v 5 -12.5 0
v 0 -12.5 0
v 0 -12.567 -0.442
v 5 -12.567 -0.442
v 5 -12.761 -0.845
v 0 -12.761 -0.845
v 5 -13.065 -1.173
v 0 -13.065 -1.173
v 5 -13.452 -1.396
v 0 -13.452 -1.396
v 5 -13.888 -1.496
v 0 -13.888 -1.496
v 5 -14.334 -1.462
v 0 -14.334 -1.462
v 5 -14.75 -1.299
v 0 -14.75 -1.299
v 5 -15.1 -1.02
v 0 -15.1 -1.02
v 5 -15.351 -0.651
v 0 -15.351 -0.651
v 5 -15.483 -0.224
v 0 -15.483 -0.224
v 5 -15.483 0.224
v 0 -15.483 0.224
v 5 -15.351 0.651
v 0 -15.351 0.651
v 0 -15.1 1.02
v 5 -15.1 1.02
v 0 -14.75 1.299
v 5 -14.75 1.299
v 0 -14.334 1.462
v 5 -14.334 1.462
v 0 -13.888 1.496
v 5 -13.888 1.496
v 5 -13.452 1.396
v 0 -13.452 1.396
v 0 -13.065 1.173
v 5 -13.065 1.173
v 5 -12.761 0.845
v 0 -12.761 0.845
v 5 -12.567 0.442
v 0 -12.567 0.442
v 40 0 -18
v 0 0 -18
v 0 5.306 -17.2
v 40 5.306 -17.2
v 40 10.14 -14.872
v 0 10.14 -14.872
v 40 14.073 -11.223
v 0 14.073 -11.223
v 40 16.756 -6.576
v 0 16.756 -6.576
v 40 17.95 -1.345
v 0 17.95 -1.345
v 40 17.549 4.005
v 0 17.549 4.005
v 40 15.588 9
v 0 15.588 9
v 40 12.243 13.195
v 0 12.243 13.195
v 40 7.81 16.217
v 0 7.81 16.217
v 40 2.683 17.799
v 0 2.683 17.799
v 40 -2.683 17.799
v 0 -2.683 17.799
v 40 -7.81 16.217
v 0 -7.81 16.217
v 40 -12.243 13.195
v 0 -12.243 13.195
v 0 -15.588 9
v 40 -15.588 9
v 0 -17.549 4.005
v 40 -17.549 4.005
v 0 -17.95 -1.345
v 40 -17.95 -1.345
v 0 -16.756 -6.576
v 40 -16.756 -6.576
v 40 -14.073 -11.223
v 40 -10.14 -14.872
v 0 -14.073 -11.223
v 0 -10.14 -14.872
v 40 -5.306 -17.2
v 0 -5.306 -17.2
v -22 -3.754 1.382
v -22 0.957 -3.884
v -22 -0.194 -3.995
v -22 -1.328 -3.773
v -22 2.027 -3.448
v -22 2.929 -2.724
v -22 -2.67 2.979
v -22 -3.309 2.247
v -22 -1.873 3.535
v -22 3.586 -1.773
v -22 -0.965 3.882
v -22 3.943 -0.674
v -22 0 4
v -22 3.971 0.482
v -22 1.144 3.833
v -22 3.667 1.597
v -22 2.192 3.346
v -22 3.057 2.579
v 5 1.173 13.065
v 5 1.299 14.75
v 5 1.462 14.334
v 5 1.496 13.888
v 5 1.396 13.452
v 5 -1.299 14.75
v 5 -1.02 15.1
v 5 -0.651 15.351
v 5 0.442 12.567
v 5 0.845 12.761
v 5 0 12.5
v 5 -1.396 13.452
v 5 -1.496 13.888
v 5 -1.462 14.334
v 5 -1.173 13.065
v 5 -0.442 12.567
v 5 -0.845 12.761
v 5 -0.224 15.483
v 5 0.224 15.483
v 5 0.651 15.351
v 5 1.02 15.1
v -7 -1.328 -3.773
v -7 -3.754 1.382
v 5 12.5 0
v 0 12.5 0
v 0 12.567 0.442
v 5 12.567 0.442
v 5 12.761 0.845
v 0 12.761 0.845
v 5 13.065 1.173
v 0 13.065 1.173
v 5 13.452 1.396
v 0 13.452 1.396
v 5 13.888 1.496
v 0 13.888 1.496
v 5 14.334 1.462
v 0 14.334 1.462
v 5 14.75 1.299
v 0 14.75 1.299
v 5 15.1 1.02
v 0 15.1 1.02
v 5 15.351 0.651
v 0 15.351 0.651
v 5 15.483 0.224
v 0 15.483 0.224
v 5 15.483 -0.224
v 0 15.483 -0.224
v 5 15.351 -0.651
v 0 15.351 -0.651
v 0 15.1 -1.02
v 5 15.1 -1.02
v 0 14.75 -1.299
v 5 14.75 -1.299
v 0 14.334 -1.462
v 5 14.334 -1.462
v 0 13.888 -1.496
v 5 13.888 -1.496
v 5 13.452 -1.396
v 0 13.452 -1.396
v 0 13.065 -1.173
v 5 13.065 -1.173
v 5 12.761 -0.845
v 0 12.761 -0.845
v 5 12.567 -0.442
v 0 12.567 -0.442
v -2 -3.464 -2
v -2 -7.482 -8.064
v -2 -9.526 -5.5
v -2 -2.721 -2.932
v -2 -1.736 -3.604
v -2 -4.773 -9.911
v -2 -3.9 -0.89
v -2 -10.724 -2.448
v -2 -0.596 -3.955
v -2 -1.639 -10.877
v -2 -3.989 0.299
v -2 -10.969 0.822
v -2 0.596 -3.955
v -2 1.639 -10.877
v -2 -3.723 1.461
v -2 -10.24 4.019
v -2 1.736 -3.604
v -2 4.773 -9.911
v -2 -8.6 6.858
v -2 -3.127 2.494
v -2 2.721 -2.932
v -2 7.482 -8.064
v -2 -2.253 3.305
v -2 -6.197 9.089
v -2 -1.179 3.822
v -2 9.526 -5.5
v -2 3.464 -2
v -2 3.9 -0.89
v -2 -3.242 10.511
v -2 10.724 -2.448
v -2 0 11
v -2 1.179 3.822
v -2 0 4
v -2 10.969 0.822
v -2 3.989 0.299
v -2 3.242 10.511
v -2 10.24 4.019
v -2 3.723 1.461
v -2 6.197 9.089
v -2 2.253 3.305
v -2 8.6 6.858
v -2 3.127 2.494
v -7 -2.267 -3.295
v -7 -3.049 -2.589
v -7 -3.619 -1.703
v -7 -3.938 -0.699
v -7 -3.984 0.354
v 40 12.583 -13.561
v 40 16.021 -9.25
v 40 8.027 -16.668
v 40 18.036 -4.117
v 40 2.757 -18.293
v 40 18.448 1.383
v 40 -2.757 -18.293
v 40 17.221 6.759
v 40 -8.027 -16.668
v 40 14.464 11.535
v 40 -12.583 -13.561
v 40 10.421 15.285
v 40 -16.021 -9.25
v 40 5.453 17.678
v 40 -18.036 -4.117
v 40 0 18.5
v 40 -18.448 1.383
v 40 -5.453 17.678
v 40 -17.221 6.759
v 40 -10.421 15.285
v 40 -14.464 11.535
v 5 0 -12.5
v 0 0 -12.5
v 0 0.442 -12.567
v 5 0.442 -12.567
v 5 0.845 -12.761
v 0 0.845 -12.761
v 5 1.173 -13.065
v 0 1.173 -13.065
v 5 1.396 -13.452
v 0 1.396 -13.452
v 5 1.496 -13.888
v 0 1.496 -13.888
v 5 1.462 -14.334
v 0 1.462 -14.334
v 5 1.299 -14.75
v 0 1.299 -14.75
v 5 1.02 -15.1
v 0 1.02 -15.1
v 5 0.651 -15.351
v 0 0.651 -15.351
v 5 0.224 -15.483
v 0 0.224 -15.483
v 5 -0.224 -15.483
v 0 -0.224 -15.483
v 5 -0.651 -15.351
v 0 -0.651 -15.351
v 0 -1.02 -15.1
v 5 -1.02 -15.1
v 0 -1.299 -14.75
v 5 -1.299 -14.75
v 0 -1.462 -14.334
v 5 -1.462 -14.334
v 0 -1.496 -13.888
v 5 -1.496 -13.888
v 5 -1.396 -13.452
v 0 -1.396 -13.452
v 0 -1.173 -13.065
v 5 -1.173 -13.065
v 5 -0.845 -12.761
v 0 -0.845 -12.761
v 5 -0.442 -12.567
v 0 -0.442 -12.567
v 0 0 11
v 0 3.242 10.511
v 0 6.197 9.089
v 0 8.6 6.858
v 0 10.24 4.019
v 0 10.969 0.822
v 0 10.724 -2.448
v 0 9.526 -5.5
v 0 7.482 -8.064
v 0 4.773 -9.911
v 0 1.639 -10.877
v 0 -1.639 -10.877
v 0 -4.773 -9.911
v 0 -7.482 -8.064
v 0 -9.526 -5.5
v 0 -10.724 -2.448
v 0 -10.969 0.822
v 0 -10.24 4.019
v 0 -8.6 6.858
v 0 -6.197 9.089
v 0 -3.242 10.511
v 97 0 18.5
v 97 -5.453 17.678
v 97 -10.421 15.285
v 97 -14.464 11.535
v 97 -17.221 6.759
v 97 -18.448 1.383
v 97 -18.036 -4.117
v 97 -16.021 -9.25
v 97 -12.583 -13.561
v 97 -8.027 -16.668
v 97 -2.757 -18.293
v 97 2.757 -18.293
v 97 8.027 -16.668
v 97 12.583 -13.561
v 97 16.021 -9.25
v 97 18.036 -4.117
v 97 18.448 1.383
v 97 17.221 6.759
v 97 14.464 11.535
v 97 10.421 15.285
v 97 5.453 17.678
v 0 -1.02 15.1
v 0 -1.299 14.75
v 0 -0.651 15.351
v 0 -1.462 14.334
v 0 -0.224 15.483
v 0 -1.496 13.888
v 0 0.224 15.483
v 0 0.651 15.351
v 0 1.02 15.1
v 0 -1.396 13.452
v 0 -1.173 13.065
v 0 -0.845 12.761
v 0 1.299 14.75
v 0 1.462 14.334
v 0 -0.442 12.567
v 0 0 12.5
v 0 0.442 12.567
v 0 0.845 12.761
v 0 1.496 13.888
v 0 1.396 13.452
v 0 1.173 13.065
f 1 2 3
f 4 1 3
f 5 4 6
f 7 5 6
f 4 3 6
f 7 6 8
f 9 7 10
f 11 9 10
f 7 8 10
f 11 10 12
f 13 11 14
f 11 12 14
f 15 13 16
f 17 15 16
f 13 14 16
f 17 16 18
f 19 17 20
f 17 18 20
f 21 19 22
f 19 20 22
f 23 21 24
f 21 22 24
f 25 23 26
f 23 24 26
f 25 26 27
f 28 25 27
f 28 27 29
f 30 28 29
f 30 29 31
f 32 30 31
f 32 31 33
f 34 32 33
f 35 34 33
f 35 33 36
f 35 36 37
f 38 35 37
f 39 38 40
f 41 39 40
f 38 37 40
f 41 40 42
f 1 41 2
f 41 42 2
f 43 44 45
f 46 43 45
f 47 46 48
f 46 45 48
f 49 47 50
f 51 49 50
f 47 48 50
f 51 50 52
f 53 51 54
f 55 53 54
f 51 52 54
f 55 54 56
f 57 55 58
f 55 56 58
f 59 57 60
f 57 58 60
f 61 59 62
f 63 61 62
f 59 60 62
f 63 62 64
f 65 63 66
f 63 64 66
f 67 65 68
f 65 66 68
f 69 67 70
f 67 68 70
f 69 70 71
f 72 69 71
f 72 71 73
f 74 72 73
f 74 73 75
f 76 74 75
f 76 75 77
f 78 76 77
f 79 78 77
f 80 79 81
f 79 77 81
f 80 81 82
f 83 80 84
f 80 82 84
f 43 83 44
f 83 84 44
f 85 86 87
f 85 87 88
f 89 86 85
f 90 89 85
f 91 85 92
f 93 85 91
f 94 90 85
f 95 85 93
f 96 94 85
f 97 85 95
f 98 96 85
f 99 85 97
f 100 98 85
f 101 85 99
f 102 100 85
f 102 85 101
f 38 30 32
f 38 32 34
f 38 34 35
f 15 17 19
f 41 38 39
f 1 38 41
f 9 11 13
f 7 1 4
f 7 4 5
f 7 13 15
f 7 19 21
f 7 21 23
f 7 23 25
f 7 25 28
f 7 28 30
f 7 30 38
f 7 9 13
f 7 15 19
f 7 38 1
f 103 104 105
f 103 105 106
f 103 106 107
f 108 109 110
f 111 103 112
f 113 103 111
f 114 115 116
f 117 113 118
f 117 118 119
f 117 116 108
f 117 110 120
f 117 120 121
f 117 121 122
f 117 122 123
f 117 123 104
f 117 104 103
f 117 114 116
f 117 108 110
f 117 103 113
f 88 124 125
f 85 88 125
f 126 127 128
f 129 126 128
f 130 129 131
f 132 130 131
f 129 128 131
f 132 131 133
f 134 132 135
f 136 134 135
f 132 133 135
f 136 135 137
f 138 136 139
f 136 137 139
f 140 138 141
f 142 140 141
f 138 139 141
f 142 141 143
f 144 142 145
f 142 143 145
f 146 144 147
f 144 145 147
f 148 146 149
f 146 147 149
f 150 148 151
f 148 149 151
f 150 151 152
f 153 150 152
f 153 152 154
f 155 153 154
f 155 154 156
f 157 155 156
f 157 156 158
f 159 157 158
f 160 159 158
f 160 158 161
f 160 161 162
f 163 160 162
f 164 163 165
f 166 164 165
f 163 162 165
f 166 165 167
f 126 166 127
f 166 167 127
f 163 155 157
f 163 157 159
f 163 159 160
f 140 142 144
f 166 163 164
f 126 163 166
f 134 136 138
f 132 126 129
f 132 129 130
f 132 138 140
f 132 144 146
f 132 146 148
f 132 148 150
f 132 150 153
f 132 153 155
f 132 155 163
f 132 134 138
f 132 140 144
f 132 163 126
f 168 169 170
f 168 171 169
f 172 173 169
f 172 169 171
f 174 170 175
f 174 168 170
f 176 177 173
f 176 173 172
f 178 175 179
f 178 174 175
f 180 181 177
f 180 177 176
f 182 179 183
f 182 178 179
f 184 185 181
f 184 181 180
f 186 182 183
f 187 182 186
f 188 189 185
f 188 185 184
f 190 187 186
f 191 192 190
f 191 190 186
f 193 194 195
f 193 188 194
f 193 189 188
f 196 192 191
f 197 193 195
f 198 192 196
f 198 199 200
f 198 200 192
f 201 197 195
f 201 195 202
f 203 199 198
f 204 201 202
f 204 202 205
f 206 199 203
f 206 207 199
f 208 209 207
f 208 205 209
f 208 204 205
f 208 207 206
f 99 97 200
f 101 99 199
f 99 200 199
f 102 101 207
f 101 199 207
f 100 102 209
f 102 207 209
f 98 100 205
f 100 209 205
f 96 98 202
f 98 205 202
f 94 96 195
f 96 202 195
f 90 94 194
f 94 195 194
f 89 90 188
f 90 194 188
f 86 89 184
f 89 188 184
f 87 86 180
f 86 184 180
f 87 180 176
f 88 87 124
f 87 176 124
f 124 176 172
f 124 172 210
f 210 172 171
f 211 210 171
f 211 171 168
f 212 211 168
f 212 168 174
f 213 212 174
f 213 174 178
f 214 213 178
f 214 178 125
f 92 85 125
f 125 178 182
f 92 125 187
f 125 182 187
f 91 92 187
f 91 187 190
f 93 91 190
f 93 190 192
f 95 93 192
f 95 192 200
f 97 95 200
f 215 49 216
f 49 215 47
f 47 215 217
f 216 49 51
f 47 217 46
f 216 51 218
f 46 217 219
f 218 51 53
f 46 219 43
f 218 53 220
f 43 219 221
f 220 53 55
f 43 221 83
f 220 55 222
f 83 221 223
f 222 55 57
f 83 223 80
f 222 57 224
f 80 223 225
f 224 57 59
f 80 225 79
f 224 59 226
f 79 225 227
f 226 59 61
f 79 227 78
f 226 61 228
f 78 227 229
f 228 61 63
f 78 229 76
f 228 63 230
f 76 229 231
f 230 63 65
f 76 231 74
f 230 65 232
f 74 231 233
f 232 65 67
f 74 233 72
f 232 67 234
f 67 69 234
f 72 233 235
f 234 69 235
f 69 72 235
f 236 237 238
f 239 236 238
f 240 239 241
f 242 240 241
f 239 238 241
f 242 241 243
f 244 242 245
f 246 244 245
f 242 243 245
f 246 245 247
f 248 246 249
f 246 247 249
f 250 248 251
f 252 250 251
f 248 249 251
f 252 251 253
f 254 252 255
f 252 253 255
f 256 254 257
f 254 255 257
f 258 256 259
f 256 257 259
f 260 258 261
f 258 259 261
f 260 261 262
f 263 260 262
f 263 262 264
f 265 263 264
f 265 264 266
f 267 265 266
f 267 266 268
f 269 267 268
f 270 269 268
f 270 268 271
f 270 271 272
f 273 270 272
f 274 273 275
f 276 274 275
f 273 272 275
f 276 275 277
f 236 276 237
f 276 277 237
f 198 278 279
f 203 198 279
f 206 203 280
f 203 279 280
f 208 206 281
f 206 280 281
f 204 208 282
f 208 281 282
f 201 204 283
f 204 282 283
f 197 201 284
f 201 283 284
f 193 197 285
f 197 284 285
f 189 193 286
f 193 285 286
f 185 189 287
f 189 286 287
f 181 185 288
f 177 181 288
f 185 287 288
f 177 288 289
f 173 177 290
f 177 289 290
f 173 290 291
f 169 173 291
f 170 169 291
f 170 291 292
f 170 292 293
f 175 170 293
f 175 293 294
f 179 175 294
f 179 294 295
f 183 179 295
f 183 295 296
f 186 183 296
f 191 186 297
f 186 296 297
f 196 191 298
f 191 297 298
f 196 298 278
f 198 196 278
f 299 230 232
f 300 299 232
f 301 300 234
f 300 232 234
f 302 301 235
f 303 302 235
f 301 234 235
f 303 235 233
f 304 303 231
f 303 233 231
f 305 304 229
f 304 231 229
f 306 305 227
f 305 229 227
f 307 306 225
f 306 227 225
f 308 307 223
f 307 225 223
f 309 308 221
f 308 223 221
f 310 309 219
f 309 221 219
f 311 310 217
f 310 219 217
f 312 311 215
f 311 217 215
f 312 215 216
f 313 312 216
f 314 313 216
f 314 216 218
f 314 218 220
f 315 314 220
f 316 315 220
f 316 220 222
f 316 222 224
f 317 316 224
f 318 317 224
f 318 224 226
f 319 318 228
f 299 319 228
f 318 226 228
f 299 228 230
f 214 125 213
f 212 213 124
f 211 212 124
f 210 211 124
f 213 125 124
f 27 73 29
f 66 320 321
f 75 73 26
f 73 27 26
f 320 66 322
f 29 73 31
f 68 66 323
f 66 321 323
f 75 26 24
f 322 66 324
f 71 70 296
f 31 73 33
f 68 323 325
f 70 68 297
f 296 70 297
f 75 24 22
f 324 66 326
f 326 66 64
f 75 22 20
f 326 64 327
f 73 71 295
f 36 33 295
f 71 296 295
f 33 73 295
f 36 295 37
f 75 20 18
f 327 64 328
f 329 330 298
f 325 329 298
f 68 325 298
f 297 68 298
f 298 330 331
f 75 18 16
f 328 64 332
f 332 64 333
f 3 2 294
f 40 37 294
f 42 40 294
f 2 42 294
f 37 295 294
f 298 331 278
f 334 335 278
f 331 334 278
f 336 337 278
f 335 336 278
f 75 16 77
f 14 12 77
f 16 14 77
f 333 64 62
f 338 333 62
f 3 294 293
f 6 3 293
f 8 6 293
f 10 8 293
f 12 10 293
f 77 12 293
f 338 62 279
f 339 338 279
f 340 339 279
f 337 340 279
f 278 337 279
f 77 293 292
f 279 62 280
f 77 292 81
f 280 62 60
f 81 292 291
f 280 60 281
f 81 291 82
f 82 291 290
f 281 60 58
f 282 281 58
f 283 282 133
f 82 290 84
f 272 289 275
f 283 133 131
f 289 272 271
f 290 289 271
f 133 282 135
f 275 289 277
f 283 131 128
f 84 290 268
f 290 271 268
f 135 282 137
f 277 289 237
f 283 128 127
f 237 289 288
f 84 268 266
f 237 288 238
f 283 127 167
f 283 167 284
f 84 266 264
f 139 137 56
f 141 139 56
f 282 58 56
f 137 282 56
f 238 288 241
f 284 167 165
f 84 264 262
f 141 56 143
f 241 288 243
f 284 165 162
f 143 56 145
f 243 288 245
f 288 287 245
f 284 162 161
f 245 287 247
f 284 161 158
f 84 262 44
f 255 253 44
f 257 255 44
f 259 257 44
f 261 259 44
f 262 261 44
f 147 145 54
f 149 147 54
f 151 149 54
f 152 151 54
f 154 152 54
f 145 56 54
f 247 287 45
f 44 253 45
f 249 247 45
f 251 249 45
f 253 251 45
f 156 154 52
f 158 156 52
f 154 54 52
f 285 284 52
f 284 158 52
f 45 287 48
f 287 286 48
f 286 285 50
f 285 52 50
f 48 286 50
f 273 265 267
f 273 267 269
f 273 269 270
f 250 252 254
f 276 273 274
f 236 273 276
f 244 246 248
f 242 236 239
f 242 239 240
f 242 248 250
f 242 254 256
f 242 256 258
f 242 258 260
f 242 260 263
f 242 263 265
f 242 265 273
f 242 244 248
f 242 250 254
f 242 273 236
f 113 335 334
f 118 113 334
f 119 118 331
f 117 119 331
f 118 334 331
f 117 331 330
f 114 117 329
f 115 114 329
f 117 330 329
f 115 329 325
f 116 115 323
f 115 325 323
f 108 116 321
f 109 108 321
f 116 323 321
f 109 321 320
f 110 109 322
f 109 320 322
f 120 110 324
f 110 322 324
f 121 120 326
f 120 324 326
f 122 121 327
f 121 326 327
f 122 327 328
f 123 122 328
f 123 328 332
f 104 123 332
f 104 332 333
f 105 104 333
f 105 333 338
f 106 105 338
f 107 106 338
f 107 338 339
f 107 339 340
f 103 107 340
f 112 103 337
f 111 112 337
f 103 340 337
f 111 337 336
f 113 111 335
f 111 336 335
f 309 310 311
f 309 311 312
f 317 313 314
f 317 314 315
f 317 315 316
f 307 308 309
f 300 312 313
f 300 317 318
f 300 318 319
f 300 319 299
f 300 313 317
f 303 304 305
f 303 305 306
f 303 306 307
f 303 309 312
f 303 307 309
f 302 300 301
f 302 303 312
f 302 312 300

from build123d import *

# Parameters (mm, degrees)
SKETCH_1_R               = 18
EXTRUDE_1_DEPTH          = 40
SKETCH_2_R               = 11
EXTRUDE_2_DEPTH          = 2
SKETCH_3_R               = 4
EXTRUDE_3_DEPTH          = 20
SKETCH_4_R               = 1.5
CUT_EXTRUDE_1_DEPTH      = 5
PATTERN_CIRCULAR_1_COUNT = 4
CUT_EXTRUDE_START        = -15
CUT_EXTRUDE_2_DEPTH      = 15
SKETCH_6_R               = 18.5
EXTRUDE_4_DEPTH          = 57


with BuildPart() as part:
    # 草图1 → 凸台-拉伸1 (new body)
    with BuildSketch(Plane(origin=(0, 0, 0), x_dir=(0, 0, -1), z_dir=(1, 0, 0))):
        Circle(SKETCH_1_R)
    extrude(amount=EXTRUDE_1_DEPTH)

    # 草图2 → 凸台-拉伸2 (add)
    with BuildSketch(Plane.ZY):
        Circle(SKETCH_2_R)
    extrude(amount=EXTRUDE_2_DEPTH)

    # 草图3 → 凸台-拉伸3 (add)
    with BuildSketch(Plane.ZY.offset(2)):
        Circle(SKETCH_3_R)
    extrude(amount=EXTRUDE_3_DEPTH)

    # 草图4 → 切除-拉伸1 (cut)
    with BuildSketch(Plane.ZY):
        with Locations((-14, 0)):
            Circle(SKETCH_4_R)
    cut_extrude_1 = extrude(amount=-CUT_EXTRUDE_1_DEPTH, mode=Mode.SUBTRACT)

    # 阵列(圆周)1: 切除-拉伸1 ×4 about axis
    pattern_circular_1_axis = Axis((0, 0, 0), (1, 0, 0))
    for i in range(1, PATTERN_CIRCULAR_1_COUNT):
        add(cut_extrude_1.rotate(pattern_circular_1_axis, i * 360 / PATTERN_CIRCULAR_1_COUNT), mode=Mode.SUBTRACT)

    # 草图5 → 切除-拉伸2 (cut)
    with BuildSketch(Plane.ZY.offset(22).offset(CUT_EXTRUDE_START)):
        with BuildLine():
            Line((-3.773069257, -1.328137186), (1.382044823, -3.753658496))
            ThreePointArc((1.382044823, -3.753658496), (-1.702949755, -3.619386983), (-3.773069257, -1.328137186))
        make_face()
    extrude(amount=CUT_EXTRUDE_2_DEPTH, mode=Mode.SUBTRACT)

    # 草图6 → 凸台-拉伸4 (add)
    with BuildSketch(Plane(origin=(40, 0, 0), x_dir=(0, 0, -1), z_dir=(1, 0, 0))):
        with Locations(Location((0, 0, 0), (0, 0, 180))):
            Circle(SKETCH_6_R)
    extrude(amount=EXTRUDE_4_DEPTH)


solid = part.part
